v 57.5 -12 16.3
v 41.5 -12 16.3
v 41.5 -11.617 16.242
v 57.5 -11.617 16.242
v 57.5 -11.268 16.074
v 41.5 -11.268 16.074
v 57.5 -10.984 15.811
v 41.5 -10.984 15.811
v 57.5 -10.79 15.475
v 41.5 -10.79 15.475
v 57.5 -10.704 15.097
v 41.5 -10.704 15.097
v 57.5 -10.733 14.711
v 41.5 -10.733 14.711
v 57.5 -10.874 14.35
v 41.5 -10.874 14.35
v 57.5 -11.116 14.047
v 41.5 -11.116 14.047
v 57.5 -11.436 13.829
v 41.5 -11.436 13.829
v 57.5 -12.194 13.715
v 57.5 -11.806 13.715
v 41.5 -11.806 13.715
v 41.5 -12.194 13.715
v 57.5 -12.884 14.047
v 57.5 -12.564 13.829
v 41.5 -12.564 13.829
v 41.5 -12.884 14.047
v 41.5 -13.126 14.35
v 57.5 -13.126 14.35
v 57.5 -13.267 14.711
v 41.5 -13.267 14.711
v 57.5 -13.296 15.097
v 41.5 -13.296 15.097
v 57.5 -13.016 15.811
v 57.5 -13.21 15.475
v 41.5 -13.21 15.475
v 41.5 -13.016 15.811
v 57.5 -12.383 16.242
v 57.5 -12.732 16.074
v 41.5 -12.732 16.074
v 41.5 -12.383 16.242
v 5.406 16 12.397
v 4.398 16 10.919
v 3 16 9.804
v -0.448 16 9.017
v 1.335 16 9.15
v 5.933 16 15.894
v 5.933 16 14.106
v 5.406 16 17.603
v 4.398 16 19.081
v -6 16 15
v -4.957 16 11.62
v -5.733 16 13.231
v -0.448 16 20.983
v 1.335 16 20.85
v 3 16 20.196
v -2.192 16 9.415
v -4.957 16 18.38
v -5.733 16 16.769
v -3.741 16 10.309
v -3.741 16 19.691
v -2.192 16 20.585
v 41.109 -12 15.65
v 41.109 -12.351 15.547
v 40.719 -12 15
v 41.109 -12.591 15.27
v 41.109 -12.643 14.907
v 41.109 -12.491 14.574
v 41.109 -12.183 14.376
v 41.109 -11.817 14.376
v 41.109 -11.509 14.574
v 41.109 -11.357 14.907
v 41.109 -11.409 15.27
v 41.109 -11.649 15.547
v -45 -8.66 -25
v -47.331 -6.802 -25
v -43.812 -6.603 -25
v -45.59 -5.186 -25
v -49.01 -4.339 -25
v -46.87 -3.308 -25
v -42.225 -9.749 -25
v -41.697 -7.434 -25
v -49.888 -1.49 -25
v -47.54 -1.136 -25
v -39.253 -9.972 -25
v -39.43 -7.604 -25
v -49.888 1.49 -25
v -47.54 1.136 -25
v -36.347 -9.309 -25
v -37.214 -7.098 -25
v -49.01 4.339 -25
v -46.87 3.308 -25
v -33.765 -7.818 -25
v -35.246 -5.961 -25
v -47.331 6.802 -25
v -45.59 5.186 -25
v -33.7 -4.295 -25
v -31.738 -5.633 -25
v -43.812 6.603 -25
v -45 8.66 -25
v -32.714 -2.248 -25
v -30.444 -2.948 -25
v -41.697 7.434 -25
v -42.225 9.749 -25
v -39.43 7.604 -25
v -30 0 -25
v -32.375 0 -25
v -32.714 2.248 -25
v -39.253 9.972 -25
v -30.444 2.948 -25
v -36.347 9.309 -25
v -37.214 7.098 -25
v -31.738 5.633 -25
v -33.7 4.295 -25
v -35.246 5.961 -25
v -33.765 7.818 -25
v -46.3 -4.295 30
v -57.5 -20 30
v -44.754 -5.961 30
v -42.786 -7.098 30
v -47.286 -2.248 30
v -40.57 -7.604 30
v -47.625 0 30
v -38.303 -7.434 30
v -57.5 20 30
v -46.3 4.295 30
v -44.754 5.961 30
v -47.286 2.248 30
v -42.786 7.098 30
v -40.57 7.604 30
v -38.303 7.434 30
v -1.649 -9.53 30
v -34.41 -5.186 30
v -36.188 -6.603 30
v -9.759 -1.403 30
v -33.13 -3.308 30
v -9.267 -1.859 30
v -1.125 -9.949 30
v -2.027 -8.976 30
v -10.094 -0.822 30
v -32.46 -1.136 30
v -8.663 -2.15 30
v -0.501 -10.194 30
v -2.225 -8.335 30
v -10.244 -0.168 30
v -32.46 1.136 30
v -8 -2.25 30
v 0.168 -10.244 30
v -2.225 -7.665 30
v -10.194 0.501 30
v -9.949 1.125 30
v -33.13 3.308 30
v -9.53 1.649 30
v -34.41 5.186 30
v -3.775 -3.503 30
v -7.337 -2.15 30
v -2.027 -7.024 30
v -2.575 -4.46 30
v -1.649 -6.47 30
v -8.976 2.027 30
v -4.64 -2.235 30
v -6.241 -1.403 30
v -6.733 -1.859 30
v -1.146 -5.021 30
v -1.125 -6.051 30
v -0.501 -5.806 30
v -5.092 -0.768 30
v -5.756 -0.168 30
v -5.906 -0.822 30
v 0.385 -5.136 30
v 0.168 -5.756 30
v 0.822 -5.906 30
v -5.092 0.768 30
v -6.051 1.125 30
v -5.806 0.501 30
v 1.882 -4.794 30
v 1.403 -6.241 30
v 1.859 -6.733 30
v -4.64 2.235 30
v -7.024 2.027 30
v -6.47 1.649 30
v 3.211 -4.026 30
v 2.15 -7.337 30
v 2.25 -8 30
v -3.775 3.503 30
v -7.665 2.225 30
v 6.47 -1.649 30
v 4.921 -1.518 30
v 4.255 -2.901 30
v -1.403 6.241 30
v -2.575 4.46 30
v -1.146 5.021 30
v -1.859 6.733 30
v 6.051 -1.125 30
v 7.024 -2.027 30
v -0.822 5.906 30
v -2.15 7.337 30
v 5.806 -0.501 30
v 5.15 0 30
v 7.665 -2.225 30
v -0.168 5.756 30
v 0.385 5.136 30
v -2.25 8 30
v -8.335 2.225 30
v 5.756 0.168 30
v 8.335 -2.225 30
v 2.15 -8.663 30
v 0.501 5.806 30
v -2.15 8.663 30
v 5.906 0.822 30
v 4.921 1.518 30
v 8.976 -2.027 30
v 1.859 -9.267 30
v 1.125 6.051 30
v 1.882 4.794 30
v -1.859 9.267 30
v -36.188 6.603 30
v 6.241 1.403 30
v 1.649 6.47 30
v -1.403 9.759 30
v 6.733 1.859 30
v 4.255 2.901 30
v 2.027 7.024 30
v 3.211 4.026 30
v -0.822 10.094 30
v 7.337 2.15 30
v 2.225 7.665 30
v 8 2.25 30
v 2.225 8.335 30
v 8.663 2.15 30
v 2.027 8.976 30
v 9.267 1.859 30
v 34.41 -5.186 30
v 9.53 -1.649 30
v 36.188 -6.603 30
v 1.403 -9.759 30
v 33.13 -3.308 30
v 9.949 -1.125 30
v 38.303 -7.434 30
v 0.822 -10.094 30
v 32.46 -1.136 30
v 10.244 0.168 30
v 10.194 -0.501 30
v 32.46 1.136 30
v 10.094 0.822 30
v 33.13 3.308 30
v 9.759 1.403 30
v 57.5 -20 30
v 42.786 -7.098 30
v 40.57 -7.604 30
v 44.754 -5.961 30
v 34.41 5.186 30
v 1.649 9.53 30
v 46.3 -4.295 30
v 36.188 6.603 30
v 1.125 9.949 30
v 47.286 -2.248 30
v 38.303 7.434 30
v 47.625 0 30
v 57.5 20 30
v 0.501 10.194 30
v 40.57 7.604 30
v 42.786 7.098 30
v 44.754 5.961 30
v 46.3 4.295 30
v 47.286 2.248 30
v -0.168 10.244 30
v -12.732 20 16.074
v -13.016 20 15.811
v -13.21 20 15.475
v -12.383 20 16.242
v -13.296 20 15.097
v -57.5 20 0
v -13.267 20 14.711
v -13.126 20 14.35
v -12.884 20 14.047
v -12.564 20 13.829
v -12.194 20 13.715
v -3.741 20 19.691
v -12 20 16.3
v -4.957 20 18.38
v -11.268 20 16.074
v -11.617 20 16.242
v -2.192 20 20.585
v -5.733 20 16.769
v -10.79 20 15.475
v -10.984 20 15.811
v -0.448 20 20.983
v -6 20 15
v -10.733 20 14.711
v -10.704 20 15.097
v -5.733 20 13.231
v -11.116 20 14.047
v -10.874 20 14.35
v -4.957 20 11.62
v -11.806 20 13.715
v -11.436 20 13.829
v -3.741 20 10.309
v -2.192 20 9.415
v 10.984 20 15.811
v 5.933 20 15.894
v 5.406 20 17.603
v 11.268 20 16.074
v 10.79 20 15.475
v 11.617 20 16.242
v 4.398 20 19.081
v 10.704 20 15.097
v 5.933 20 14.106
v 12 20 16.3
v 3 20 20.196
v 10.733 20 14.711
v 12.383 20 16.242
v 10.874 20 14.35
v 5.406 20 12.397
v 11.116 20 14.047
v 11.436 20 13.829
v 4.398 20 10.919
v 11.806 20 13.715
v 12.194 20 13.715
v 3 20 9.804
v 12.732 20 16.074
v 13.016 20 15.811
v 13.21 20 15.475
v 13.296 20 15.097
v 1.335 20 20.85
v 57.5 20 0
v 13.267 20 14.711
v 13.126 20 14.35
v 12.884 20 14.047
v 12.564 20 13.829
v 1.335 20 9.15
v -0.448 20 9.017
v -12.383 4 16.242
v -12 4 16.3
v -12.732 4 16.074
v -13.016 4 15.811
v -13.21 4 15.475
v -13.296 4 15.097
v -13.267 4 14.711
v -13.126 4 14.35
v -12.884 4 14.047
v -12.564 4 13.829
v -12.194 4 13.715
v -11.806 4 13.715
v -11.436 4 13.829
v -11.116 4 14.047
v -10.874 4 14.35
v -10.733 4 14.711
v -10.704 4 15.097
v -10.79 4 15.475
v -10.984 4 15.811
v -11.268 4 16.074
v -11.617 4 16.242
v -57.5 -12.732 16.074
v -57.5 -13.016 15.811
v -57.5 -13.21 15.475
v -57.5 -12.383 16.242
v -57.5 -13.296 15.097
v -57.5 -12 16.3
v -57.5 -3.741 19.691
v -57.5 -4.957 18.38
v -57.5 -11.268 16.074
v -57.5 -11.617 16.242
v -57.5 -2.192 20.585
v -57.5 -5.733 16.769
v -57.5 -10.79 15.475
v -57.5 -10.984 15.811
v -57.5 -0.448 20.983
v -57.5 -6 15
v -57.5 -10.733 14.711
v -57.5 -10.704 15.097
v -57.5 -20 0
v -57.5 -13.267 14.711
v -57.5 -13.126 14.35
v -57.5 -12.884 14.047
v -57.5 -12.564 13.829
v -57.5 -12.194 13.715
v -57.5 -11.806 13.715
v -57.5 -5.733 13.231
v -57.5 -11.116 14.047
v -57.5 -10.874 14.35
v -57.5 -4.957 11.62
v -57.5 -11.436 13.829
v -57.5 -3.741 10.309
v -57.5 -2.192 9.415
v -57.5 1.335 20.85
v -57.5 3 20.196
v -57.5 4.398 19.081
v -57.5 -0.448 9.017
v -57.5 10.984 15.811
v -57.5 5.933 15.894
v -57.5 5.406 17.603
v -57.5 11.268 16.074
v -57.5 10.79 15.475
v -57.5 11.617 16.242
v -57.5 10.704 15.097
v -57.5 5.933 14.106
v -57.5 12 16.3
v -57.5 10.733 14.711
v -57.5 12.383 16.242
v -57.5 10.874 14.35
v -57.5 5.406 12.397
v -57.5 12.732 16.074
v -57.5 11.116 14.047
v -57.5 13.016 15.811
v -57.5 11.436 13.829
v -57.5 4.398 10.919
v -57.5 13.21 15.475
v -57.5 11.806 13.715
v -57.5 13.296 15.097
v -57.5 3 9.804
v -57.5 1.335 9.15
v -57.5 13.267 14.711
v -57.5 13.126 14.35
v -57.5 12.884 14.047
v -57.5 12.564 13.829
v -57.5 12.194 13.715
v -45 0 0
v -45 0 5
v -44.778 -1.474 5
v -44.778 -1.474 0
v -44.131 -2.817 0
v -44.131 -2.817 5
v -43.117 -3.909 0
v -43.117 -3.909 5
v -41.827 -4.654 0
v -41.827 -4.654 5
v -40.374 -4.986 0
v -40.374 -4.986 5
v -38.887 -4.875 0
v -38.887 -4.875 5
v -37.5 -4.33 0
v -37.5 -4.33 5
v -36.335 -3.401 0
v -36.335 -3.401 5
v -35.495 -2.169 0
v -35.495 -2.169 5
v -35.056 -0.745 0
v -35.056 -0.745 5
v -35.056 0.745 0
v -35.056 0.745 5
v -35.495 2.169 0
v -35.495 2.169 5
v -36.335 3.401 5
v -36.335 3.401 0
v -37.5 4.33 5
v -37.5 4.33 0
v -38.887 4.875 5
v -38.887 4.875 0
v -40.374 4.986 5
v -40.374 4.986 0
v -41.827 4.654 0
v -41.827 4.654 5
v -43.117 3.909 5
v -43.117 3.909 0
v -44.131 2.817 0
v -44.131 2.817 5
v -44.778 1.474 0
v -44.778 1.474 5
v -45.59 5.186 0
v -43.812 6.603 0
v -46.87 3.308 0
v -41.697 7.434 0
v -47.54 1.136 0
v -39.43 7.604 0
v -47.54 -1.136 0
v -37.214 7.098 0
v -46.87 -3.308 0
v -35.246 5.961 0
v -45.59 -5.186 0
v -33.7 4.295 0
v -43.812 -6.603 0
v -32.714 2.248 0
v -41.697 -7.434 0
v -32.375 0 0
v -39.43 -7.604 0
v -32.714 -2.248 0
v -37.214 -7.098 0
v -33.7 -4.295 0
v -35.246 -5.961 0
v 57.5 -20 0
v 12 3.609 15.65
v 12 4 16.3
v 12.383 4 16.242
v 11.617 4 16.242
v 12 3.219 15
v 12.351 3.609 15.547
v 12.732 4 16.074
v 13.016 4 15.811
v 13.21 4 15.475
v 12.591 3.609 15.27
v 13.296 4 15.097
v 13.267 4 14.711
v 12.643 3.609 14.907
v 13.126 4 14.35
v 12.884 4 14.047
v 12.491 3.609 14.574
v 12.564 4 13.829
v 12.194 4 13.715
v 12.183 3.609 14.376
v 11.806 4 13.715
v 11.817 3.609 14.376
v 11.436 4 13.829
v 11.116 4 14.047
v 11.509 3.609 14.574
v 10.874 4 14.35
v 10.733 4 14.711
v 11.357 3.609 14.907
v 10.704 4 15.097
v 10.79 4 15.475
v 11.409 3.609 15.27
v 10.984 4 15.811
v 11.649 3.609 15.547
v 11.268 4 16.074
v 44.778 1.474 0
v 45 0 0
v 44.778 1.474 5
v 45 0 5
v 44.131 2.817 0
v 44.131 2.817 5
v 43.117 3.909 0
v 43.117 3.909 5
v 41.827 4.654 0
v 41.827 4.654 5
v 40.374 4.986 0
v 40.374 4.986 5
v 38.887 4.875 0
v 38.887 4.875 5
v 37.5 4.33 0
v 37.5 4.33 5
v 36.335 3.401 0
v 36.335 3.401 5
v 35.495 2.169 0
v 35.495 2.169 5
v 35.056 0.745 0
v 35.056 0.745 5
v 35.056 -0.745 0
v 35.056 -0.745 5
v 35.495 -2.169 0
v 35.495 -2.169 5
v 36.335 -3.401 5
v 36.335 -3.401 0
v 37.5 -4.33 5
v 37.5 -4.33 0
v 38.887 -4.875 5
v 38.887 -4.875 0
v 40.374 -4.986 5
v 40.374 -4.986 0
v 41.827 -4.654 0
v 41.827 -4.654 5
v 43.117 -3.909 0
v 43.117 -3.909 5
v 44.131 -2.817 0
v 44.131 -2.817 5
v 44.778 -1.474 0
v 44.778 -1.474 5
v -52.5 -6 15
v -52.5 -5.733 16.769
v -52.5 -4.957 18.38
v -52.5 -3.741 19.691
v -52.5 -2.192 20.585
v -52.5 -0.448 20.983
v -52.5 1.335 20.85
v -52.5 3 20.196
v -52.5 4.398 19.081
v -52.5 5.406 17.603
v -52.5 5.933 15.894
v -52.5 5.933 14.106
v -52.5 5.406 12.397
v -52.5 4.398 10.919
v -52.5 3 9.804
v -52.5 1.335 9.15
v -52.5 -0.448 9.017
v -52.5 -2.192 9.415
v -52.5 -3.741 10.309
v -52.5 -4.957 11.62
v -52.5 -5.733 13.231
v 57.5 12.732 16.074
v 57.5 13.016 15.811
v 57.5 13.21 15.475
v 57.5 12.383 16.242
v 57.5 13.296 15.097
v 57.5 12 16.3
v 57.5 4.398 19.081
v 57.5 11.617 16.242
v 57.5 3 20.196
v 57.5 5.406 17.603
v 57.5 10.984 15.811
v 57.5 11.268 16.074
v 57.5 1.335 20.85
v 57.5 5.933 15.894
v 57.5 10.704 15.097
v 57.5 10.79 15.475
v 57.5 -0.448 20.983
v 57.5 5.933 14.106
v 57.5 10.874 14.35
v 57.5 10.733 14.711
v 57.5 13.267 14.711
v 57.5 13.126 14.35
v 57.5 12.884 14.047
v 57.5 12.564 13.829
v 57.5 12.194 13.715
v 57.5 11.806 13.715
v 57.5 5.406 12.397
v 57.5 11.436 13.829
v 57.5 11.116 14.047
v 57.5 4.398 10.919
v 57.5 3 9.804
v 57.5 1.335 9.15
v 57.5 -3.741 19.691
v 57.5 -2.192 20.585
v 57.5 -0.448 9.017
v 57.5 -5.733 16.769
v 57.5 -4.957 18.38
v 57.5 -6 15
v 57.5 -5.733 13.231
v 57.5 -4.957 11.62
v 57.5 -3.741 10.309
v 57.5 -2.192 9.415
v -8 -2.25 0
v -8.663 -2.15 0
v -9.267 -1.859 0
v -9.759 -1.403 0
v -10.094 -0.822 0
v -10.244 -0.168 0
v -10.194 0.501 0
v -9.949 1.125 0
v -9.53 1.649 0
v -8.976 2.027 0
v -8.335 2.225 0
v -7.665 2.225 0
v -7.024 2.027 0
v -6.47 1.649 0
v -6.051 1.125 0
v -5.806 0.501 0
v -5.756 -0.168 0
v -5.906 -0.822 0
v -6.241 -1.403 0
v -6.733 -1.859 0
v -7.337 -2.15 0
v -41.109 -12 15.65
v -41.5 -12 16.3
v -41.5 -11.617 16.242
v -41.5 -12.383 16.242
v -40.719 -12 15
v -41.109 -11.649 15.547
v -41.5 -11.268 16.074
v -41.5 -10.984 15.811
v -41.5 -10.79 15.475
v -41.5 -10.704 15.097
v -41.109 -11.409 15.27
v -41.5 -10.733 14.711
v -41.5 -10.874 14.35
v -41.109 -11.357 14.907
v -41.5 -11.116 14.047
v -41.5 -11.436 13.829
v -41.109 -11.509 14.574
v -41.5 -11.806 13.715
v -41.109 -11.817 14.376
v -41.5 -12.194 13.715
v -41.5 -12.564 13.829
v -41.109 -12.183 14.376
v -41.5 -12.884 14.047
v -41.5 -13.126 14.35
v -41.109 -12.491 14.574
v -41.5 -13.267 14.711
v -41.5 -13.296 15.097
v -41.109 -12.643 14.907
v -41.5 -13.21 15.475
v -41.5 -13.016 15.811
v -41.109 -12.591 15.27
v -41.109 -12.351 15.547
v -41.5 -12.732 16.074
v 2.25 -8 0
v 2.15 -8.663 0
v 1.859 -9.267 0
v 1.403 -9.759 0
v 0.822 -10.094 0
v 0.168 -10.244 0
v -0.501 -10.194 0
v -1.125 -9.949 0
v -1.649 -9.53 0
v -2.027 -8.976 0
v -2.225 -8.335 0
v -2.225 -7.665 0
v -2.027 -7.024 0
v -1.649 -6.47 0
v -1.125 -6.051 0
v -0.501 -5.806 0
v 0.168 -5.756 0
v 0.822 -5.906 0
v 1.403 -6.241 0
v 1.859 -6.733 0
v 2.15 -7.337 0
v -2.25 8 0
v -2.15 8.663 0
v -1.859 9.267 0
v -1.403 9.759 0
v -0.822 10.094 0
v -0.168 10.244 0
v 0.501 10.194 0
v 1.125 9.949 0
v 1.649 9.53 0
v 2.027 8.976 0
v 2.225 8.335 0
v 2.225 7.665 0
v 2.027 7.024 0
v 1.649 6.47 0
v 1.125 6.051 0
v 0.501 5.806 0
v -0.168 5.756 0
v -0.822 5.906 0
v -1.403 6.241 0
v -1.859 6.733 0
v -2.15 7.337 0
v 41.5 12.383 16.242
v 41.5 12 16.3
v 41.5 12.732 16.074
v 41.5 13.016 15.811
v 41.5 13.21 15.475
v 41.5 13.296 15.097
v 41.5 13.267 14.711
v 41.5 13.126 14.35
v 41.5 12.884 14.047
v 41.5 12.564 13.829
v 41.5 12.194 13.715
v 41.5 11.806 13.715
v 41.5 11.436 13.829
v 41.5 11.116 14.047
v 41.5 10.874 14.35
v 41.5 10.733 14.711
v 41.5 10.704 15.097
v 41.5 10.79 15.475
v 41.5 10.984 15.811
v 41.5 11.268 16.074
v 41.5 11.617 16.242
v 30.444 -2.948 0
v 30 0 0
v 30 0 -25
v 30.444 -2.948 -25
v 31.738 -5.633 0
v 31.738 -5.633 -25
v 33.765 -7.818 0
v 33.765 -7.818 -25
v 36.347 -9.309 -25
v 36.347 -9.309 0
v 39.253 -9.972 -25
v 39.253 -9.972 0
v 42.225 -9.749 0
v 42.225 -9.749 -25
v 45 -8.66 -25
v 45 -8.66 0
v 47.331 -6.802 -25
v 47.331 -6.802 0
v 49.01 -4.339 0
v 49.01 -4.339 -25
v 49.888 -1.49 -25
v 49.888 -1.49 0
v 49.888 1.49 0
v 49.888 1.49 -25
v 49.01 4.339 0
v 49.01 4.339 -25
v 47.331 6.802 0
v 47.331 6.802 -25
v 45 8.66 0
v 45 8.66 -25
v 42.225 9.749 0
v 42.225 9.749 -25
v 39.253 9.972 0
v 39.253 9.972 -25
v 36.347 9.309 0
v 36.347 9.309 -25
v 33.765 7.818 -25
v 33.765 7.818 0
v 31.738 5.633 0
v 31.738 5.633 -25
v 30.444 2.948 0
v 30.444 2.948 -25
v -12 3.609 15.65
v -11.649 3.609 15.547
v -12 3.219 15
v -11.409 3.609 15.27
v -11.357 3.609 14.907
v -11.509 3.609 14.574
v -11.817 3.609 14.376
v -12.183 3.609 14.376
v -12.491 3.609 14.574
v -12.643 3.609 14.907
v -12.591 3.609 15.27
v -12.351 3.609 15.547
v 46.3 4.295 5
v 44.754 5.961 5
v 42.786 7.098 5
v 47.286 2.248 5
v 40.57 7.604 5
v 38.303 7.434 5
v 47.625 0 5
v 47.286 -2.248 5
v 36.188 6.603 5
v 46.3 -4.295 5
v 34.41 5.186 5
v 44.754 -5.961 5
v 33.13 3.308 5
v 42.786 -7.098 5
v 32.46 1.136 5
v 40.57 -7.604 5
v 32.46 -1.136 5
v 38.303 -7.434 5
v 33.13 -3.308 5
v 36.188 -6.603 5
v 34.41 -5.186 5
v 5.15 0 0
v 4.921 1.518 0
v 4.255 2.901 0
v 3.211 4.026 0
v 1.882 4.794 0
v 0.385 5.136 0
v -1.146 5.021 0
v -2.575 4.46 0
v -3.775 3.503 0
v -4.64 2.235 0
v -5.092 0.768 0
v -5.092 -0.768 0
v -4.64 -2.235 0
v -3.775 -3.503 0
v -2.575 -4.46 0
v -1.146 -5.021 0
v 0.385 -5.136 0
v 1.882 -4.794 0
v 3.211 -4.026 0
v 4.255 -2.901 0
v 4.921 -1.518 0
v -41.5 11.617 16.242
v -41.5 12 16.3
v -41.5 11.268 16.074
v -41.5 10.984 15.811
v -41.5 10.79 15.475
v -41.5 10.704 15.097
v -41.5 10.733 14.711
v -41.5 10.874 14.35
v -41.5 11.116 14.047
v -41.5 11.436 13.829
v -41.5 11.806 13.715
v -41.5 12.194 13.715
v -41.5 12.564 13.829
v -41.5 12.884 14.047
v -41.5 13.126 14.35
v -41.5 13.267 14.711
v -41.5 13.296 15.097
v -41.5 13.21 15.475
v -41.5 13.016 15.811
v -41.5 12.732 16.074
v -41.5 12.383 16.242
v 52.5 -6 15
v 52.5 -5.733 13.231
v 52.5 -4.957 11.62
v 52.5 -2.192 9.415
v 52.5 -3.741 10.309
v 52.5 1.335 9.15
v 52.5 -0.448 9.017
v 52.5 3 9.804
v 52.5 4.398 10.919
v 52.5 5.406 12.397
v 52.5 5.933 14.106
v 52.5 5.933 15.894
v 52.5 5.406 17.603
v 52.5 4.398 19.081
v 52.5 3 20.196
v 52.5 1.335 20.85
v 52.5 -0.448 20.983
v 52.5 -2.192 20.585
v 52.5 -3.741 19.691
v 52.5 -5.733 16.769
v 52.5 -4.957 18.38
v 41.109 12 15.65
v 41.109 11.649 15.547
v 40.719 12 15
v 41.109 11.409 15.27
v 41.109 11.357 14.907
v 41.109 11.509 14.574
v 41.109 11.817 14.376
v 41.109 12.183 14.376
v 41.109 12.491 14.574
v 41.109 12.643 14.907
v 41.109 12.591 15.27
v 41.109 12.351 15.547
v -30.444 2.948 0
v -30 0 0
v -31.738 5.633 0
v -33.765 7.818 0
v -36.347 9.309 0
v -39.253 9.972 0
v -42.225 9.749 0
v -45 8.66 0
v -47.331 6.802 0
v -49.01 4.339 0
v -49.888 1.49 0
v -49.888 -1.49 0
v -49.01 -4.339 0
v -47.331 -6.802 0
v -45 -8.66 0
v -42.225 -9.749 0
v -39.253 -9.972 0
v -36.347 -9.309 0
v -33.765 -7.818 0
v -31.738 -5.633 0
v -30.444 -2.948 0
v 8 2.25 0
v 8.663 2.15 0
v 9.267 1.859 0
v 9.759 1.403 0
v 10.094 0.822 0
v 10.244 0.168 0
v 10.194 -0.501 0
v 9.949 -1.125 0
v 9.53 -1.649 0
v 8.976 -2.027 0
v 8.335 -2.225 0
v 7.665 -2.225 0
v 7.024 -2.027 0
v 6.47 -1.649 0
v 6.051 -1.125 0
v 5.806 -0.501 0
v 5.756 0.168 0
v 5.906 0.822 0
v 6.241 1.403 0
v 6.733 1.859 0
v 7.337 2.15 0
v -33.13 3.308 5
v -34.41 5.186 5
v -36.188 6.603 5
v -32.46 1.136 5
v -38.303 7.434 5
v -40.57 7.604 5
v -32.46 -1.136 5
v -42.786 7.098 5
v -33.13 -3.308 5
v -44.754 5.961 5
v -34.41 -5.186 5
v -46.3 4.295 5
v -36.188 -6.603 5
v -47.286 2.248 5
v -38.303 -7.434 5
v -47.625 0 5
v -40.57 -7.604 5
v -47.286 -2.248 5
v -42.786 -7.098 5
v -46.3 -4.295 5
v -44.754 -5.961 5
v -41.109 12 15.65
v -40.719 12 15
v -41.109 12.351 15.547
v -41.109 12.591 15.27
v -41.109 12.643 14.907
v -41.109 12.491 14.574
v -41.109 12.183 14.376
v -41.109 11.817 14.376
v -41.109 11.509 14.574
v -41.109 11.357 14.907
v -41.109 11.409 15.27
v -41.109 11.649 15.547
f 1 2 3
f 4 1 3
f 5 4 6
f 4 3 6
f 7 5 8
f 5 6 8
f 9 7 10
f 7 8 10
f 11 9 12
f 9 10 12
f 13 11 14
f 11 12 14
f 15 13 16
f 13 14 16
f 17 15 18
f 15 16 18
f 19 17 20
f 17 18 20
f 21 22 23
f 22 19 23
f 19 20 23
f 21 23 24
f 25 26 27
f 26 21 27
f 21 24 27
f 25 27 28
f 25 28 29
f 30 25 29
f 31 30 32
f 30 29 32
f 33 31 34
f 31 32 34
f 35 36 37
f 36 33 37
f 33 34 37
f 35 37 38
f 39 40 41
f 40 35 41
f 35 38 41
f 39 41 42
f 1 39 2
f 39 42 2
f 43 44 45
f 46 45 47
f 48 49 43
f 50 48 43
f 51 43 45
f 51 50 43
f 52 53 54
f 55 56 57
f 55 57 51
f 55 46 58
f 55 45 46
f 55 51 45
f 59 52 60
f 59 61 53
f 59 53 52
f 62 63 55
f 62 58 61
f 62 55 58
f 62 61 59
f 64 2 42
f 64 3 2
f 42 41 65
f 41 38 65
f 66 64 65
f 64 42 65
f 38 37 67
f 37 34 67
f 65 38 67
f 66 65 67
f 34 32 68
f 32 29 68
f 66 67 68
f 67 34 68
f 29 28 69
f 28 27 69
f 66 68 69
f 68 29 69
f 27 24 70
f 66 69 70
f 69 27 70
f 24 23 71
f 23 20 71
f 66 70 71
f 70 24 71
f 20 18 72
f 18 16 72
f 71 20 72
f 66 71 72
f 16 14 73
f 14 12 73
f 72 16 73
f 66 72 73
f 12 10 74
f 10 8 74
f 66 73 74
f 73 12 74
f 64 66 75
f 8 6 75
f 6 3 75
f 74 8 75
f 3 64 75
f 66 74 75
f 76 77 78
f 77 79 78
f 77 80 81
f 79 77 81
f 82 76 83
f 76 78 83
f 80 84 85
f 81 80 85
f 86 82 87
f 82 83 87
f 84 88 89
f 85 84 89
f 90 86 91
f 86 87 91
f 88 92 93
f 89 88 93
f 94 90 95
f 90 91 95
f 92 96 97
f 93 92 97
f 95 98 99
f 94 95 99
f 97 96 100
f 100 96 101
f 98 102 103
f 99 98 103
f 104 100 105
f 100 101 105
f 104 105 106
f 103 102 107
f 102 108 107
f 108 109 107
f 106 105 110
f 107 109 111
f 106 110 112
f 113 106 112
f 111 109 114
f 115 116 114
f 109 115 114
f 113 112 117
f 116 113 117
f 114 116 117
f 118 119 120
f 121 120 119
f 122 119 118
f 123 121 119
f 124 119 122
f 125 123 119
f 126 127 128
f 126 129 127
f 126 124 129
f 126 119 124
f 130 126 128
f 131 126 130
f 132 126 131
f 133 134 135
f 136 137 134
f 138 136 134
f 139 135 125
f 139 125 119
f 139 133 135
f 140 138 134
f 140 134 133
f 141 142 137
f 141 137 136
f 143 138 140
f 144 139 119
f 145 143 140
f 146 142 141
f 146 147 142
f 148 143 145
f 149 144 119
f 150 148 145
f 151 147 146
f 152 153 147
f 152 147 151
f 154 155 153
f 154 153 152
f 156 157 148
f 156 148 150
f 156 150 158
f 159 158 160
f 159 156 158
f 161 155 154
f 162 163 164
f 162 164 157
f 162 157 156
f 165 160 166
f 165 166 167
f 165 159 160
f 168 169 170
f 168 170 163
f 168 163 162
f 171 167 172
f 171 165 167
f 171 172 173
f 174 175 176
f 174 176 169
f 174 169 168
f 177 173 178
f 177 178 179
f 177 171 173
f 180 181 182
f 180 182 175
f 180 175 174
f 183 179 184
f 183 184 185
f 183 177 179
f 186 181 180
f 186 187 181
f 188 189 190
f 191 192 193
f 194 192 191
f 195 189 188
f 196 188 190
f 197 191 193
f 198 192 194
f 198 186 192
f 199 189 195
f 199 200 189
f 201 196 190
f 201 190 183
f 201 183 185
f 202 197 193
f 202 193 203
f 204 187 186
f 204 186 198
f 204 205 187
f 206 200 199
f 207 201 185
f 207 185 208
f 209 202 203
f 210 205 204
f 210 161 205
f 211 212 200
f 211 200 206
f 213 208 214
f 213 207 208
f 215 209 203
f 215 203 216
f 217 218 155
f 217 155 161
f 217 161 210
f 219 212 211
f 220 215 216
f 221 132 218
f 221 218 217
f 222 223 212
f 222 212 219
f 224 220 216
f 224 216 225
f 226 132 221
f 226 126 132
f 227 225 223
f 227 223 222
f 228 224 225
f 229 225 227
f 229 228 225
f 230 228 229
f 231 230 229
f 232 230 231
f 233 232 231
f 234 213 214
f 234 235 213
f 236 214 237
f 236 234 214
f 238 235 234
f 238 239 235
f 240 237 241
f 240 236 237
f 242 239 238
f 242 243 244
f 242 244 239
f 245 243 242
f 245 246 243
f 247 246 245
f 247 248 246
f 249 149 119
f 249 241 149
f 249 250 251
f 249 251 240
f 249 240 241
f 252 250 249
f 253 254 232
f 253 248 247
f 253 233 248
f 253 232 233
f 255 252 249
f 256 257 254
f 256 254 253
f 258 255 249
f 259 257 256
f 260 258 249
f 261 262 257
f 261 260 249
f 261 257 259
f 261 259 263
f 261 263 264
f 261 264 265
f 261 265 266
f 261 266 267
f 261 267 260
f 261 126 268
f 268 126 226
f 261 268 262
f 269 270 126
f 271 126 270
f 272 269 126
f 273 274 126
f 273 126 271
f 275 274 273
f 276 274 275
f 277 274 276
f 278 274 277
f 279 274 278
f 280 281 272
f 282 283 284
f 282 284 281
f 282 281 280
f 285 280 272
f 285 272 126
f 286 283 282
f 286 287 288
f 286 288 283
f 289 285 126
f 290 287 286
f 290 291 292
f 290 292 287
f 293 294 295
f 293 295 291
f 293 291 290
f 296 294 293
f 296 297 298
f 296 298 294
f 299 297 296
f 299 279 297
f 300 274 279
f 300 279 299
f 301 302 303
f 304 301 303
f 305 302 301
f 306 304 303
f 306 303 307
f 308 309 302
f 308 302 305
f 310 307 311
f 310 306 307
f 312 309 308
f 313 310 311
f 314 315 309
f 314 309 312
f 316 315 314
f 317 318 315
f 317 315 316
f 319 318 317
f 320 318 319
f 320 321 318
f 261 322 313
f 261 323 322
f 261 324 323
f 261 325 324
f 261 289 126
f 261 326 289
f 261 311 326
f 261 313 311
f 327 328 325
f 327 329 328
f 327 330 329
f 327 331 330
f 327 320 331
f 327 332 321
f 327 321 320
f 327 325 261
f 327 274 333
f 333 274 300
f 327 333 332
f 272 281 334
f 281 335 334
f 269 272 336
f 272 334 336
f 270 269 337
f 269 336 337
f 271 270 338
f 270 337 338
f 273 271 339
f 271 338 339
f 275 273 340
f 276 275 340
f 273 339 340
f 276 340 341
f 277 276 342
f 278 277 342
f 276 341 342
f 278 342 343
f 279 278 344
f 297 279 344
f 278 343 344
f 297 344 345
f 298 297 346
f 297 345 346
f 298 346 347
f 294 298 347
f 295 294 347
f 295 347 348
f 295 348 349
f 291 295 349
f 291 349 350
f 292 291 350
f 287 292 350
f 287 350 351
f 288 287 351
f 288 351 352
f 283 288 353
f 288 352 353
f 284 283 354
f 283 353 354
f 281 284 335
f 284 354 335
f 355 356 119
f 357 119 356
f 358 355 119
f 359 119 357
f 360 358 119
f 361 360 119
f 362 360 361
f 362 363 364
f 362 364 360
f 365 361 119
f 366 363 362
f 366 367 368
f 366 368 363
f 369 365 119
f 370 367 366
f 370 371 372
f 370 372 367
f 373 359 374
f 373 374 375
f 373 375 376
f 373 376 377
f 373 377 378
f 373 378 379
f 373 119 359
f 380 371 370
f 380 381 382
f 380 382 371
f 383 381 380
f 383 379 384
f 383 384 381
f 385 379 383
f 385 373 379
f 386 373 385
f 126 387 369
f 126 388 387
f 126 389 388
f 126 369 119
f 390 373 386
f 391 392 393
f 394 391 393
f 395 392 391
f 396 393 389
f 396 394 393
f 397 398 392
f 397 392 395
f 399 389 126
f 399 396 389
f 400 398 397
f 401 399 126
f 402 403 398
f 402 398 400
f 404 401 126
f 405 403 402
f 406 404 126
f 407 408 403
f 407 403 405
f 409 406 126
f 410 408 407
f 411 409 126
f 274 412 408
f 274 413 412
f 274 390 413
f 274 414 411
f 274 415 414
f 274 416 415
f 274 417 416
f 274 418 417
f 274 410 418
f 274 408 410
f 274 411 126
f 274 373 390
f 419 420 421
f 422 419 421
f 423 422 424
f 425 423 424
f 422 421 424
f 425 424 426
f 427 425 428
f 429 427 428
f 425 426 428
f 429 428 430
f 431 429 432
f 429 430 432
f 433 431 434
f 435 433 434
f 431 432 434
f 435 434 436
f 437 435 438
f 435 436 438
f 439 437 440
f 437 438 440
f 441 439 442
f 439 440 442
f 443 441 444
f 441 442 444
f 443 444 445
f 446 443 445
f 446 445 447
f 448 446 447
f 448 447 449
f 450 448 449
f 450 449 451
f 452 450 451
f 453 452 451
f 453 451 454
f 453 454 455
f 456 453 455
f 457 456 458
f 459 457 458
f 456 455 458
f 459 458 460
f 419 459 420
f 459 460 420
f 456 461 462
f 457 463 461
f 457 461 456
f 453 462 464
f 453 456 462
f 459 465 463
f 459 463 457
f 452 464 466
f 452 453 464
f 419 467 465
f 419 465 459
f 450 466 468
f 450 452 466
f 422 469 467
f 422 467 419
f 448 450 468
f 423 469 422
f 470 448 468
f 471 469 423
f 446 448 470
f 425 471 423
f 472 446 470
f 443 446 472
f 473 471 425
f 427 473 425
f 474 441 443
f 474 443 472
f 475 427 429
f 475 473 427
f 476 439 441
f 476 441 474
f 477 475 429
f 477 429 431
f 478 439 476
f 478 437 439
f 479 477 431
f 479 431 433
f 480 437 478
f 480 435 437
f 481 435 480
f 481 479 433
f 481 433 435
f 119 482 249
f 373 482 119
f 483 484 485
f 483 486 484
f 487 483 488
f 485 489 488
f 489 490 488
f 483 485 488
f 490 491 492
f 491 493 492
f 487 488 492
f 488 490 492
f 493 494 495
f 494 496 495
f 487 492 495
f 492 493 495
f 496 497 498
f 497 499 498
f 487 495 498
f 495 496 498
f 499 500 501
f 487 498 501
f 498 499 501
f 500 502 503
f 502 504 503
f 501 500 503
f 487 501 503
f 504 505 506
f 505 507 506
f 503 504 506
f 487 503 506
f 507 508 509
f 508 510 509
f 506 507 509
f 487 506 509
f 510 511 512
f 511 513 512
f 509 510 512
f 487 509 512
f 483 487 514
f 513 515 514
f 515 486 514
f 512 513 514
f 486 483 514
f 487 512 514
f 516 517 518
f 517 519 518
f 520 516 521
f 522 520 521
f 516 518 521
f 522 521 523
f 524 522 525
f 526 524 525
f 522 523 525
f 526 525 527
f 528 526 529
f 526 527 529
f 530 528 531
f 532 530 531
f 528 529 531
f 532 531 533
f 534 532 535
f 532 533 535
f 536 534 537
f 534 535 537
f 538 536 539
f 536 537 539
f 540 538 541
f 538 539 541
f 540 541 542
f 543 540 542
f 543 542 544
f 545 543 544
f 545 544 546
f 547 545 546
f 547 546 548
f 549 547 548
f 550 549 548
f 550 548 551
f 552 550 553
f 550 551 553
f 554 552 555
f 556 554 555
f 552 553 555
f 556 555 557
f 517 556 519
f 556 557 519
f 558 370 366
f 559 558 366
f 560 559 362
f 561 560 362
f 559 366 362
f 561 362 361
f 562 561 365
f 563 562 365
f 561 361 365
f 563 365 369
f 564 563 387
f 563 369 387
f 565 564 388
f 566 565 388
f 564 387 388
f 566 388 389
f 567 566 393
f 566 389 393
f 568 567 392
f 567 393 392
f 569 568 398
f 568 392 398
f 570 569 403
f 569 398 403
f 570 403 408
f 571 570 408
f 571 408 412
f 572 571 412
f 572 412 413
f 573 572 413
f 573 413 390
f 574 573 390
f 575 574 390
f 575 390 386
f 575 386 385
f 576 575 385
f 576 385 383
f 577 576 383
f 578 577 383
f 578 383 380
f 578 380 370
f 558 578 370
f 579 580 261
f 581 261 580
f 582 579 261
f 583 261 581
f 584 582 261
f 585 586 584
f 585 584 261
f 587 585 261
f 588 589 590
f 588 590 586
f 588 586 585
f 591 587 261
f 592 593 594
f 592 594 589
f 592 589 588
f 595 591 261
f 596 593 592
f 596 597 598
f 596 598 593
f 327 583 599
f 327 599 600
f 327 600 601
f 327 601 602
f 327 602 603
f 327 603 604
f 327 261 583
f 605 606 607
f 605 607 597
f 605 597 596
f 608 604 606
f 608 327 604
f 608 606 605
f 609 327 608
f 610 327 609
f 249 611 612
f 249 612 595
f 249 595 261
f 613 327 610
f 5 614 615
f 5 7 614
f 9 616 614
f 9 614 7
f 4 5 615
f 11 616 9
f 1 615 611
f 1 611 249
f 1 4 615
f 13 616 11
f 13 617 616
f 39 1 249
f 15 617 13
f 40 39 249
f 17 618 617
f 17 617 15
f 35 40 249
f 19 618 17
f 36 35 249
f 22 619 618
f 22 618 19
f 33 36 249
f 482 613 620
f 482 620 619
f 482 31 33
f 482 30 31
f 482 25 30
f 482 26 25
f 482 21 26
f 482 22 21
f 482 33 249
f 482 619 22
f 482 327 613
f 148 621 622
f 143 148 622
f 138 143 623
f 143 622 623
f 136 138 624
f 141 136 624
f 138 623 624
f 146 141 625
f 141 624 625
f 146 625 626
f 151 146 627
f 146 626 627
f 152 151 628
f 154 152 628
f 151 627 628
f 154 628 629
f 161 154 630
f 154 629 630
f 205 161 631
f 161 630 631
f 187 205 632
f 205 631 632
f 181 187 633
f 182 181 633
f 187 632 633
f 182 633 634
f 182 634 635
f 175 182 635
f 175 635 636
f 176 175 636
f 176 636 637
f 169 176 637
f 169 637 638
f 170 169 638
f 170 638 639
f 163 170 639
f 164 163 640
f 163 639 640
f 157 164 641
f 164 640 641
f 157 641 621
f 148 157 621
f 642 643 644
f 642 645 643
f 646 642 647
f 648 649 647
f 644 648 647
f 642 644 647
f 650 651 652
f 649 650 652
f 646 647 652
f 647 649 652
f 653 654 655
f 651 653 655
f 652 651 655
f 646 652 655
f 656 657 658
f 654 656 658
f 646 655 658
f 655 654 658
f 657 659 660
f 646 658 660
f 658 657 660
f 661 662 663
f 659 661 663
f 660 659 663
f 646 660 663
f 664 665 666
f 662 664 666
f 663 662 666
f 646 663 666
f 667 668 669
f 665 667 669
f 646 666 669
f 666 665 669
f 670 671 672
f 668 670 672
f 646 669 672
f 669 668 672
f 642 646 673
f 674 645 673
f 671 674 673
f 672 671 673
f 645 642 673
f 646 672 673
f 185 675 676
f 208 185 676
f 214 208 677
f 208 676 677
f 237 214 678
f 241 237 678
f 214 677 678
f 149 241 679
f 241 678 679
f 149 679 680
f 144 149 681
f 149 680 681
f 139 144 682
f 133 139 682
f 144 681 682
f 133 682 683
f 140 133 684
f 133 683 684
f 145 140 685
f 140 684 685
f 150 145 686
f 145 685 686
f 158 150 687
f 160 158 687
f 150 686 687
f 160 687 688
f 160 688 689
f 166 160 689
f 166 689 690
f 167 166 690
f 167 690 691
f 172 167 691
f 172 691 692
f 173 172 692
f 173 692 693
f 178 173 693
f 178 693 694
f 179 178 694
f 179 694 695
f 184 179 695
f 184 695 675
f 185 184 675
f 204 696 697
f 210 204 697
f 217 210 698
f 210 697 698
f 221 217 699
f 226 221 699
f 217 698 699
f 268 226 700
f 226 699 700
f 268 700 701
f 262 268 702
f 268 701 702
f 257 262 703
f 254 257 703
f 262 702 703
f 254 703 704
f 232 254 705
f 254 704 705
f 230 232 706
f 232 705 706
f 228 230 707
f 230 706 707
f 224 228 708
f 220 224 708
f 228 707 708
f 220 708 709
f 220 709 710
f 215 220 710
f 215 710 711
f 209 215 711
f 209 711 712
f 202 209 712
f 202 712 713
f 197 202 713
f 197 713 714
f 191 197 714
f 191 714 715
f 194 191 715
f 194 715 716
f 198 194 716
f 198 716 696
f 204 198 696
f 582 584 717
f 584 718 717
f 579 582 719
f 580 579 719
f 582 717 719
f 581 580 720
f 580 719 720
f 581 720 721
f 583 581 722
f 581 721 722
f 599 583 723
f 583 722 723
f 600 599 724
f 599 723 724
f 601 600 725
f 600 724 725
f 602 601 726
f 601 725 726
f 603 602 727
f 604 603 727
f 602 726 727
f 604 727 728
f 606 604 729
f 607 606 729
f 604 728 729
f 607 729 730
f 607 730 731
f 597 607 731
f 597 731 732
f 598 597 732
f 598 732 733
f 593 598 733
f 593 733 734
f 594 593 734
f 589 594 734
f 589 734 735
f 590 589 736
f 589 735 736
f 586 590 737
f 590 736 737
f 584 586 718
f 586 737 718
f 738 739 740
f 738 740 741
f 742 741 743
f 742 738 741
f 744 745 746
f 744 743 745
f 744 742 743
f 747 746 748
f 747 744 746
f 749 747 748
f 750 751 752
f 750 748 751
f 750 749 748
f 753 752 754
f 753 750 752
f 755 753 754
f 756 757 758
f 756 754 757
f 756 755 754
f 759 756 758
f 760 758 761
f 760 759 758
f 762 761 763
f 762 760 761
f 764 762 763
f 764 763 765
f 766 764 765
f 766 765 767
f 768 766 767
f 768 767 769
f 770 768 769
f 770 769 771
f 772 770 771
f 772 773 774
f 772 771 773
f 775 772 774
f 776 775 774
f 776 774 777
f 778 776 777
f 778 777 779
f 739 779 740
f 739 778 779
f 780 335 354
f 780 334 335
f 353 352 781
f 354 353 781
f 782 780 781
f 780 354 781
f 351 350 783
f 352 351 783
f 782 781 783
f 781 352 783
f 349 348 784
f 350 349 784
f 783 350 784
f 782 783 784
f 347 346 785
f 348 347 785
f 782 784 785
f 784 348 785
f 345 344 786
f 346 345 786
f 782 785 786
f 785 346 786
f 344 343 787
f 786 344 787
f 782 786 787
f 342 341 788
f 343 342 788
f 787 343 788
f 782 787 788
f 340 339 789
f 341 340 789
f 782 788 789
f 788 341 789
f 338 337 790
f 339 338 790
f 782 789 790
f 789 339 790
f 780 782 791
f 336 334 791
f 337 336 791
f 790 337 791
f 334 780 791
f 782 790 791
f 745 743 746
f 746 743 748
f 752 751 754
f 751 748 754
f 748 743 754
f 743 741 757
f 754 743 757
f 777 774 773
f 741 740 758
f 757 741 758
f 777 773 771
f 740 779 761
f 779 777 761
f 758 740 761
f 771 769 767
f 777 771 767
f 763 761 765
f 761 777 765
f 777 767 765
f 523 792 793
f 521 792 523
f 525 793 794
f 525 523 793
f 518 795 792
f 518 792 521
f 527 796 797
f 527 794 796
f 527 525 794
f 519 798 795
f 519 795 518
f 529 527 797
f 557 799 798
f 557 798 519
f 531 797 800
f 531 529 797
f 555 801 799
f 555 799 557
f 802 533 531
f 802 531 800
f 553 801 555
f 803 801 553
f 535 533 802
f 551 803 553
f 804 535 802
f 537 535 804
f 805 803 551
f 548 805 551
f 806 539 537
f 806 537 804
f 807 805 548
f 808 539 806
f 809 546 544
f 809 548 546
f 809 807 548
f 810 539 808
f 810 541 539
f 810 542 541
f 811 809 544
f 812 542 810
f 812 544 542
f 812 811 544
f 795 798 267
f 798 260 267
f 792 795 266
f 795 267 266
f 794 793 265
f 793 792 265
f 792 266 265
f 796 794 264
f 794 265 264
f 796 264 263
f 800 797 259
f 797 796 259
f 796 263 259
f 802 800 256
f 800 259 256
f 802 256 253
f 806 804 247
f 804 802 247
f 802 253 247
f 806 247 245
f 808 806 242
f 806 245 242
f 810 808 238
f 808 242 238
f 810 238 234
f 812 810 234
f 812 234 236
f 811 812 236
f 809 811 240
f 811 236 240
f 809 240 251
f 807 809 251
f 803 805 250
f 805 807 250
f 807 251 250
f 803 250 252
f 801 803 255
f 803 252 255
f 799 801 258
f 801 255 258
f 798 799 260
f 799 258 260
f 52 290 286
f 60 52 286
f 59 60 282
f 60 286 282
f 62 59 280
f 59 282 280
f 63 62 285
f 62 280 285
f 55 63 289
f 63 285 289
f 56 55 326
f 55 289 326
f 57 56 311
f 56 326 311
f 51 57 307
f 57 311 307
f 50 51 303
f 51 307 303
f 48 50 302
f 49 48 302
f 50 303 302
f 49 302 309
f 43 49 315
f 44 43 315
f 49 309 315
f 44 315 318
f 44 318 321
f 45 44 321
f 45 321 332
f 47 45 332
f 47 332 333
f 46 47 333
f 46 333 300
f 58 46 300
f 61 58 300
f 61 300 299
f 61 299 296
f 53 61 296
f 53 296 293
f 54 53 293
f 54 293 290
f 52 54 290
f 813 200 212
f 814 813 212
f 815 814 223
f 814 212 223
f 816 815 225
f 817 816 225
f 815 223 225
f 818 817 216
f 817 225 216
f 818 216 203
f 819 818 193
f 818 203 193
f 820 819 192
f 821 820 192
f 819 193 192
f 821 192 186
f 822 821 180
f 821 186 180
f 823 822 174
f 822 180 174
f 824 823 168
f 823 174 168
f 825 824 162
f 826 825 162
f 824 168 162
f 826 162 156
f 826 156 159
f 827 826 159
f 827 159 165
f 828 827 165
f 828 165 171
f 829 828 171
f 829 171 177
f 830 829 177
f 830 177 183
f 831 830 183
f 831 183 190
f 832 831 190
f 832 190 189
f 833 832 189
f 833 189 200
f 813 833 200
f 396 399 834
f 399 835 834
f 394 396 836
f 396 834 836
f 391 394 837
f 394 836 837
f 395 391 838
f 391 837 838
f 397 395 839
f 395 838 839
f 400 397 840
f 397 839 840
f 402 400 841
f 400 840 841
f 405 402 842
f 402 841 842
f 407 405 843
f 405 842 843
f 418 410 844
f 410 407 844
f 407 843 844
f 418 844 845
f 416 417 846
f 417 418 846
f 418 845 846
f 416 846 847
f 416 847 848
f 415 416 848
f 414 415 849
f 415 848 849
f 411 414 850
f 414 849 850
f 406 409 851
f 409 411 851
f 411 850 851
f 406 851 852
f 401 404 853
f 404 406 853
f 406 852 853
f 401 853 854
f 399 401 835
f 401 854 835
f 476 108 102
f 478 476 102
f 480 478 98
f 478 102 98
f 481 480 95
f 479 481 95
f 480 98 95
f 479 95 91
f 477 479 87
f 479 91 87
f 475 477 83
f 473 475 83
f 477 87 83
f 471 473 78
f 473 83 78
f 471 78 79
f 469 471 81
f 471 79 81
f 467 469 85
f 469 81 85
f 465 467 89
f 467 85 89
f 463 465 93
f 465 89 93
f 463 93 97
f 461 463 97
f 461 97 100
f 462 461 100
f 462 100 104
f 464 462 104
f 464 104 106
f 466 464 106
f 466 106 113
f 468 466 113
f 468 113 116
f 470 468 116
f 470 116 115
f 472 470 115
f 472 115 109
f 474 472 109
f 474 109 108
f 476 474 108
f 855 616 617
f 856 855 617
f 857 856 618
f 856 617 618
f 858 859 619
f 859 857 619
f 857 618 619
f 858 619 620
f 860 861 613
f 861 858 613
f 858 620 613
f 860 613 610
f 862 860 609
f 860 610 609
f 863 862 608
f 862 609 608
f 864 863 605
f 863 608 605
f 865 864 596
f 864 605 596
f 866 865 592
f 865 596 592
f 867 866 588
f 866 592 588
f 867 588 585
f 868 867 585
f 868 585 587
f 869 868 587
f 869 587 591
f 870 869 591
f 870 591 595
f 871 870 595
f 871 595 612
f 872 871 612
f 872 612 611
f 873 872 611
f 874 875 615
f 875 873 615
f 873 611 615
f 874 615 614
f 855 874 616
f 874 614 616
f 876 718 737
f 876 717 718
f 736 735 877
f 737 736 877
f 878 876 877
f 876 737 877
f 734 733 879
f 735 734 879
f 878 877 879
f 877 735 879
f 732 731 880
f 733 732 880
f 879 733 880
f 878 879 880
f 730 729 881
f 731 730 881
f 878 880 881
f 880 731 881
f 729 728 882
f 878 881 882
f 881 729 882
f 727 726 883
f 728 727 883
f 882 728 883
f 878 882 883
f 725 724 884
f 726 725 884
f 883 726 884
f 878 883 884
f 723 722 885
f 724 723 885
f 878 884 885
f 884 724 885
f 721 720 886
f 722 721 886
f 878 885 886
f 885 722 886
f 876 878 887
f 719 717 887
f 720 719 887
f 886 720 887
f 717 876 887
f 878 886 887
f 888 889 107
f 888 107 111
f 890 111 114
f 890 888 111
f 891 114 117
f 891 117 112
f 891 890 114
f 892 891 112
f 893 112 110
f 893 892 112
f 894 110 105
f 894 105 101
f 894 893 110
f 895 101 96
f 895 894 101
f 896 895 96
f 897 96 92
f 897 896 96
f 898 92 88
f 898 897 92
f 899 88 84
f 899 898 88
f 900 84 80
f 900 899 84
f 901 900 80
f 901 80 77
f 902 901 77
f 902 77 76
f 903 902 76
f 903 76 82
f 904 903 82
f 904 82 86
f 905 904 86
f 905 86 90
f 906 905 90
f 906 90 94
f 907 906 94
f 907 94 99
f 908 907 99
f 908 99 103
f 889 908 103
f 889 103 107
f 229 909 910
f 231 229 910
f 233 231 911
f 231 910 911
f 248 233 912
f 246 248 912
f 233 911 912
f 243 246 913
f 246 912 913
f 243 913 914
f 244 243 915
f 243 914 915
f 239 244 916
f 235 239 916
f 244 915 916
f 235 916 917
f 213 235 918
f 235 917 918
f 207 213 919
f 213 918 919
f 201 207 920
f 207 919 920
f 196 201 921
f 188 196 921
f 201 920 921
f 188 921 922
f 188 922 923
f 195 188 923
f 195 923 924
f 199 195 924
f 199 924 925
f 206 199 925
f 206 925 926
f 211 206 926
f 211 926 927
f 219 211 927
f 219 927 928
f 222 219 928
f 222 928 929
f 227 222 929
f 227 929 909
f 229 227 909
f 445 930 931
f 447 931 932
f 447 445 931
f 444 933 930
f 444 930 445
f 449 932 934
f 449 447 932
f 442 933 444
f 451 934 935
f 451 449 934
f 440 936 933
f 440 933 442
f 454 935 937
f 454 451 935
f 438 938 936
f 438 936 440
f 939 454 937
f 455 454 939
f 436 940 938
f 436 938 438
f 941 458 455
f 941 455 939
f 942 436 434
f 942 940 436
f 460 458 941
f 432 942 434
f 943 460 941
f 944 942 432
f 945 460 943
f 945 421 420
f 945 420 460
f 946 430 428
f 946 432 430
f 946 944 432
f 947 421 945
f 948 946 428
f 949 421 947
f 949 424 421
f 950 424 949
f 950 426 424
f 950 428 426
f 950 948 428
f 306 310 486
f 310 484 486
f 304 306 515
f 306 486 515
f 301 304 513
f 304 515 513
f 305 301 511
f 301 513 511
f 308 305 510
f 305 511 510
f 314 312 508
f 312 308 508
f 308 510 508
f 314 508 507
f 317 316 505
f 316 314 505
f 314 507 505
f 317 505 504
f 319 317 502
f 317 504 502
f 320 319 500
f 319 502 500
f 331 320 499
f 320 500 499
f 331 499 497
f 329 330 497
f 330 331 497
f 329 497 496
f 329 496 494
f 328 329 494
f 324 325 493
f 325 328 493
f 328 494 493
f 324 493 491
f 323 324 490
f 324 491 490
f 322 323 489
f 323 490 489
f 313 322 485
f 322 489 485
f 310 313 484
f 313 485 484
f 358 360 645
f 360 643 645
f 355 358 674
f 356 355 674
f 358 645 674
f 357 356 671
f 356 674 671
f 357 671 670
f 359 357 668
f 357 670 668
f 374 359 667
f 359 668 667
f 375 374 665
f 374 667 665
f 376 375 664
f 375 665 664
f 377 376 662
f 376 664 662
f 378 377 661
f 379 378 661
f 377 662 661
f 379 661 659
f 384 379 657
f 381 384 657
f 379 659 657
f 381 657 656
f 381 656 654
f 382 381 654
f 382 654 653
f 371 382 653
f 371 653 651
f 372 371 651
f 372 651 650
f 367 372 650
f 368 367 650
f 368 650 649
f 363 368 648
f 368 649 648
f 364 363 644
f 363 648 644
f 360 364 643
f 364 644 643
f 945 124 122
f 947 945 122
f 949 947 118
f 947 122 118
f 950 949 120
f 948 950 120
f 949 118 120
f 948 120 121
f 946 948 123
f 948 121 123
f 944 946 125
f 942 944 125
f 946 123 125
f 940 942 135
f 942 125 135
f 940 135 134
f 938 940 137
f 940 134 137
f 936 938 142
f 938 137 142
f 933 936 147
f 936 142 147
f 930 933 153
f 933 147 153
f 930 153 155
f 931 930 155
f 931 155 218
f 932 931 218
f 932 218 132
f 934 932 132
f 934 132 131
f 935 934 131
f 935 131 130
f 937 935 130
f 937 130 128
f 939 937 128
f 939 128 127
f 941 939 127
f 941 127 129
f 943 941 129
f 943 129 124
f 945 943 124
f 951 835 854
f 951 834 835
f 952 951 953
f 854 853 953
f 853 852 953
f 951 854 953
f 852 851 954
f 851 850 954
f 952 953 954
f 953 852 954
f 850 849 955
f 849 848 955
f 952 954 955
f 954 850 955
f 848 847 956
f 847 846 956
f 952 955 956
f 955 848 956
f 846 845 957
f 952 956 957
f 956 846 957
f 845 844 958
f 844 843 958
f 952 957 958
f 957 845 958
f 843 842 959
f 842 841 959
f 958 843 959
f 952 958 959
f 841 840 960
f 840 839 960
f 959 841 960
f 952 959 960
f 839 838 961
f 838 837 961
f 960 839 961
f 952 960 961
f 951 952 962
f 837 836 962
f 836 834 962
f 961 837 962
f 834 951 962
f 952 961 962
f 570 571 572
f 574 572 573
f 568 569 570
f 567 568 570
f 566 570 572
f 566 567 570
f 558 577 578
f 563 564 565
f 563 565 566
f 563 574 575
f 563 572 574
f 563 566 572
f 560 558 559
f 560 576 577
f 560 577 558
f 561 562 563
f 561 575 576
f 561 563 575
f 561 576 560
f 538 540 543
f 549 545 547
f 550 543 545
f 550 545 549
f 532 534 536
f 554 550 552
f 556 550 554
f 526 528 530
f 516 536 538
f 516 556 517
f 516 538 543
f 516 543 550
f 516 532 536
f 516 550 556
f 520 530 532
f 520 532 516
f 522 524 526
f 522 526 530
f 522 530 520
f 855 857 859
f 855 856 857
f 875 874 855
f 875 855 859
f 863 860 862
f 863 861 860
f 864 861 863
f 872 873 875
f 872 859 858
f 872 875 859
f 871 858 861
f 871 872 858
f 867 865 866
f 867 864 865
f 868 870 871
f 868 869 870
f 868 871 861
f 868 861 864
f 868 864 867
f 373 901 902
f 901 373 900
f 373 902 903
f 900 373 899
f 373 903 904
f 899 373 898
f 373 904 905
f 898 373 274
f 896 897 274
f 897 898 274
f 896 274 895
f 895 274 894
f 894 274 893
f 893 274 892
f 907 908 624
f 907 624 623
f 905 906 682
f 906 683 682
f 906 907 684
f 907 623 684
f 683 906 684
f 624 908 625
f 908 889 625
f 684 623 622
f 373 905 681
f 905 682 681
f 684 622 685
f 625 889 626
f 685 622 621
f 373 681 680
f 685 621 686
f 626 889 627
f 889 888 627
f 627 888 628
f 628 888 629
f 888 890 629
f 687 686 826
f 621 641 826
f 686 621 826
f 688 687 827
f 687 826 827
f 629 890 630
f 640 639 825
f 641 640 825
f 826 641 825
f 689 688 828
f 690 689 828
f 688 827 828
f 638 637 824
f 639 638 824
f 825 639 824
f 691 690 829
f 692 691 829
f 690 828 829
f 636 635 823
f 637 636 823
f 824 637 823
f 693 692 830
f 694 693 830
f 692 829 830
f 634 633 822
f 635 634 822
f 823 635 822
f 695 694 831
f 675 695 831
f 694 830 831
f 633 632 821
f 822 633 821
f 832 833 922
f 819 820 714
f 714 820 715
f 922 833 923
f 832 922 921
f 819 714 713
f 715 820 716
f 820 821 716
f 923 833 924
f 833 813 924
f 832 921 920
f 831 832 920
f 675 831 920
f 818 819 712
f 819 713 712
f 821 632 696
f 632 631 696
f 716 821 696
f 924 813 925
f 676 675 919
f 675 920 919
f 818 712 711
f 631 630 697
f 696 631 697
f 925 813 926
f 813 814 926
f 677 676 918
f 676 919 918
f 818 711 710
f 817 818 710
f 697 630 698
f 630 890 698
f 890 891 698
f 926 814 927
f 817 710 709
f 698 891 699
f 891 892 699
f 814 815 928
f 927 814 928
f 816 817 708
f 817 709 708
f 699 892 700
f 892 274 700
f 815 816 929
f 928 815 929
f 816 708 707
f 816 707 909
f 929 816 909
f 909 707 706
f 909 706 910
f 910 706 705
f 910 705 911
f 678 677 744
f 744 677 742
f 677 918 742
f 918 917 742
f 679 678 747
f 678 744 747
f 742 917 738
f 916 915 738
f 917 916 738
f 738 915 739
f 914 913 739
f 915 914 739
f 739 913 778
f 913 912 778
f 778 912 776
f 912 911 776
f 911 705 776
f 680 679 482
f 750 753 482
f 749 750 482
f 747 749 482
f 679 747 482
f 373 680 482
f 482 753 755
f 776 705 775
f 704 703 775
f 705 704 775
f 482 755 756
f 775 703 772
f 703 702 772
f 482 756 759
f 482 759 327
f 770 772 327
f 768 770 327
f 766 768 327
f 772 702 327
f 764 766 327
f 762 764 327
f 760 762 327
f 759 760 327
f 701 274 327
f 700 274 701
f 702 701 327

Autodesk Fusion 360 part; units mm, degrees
sketch "Esquisse1" plane through (0, 0, 0) normal (0, 0, 1) x (1, 0, 0)
  line L0 (-57.5, 20) -> (57.5, 20)
  line L1 (57.5, 20) -> (57.5, -20)
  line L2 (57.5, -20) -> (-57.5, -20)
  line L3 (-57.5, -20) -> (-57.5, 20)
  line L4 (0, 1.75) -> (0, 22.5)
  line L5 (1.75, 0) -> (22.5, 0)
  dimension "d1" = 115
  dimension "d2" = 40
extrude "Extrusion1" add sketch "Esquisse1" along normal blind 30
sketch "Esquisse2" plane through (0, 0, 30) normal (0, 0, 1) x (-1, 0, 0)
  line L0 (57.5, 20) -> (-57.5, 20)
  line L1 (-57.5, 20) -> (-57.5, -20)
  line L2 (-57.5, -20) -> (57.5, -20)
  line L3 (57.5, -20) -> (57.5, 20)
  circle A0 centre (40, 0) radius 7.625
  line L4 (0, -1.75) -> (0, -22.5)
  line L5 (-1.75, 0) -> (-22.5, 0)
  dimension "d5" = 15.25
  dimension "d6" = 40
extrude "Extrusion2" cut sketch "Esquisse2" against normal blind 25 contours A0
mirror "Symétrie miroir1" about plane through (0, 0, 0) normal (1, 0, 0) of "Extrusion2"
sketch "Esquisse3" plane through (0, 0, 30) normal (0, 0, 1) x (-1, 0, 0)
  circle A0 centre (-40, 0) radius 7.625
  circle A1 centre (40, 0) radius 7.625
  line L0 (57.5, 20) -> (-57.5, 20)
  line L1 (-57.5, 20) -> (-57.5, -20)
  line L2 (-57.5, -20) -> (57.5, -20)
  line L3 (57.5, -20) -> (57.5, 20)
sketch "Esquisse4" plane through (0, 0, 30) normal (0, 0, 1) x (1, 0, 0)
  circle A0 centre (-40, 0) radius 12 construction
  line L0 (1.75, 0) -> (22.5, 0)
  point P0 (-52, 0)
  dimension "d11" = 24
  dimension "d12" = 40
sketch "Esquisse5" plane through (0, 0, 30) normal (0, 0, 1) x (1, 0, 0)
  circle A0 centre (0, 0) radius 5.15
  dimension "d20" = 10.3
extrude "Extrusion3" cut sketch "Esquisse5" against normal blind 75
sketch "Esquisse6" plane through (0, 0, 30) normal (0, 0, 1) x (1, 0, 0)
  point P0 (-8, 0)
  dimension "d23" = 8
hole "Perçage2" at (-8, 0, 30) direction (0, 0, -1) diameter 4.5 depth 50 tip angle 118
pattern_circular "Réseau C2" count 4 over 360 about axis through (0, 0, 30) along (0, 0, -1) of "Perçage2"
sketch "Esquisse7" plane through (0, 0, 30) normal (0, 0, 1) x (1, 0, 0)
sketch "Esquisse8" plane through (0, 0, 30) normal (0, 0, 1) x (-1, 0, 0)
  circle A0 centre (40, 0) radius 5
  dimension "d31" = 10
extrude "Extrusion4" cut sketch "Esquisse8" against normal blind 51
mirror "Symétrie miroir4" about plane through (0, 0, 0) normal (1, 0, 0) of "Extrusion4"
sketch "Esquisse9" plane through (0, 0, 0) normal (0, 0, 1) x (1, 0, 0)
  circle A0 centre (-40, 0) radius 10
  dimension "d36" = 20
extrude "Extrusion5" add sketch "Esquisse9" against normal blind 25
sketch "Esquisse10" plane through (0, 0, -25) normal (0, 0, -1) x (1, 0, 0)
  circle A0 centre (-40, 0) radius 10
sketch "Esquisse11" plane through (0, 0, -25) normal (0, 0, -1) x (1, 0, 0)
  circle A0 centre (-40, 0) radius 7.625
  dimension "d39" = 15.25
extrude "Extrusion6" cut sketch "Esquisse11" against normal blind 25
mirror "Symétrie miroir5" about plane through (0, 0, 0) normal (1, 0, 0) of "Extrusion6", "Extrusion5"
sketch "Esquisse12" plane through (0, 20, 0) normal (0, 1, 0) x (-1, 0, 0)
  line L0 (-57.5, 0) -> (57.5, 0)
  line L1 (57.5, 0) -> (57.5, 30)
  line L2 (57.5, 30) -> (-57.5, 30)
  line L3 (-57.5, 30) -> (-57.5, 0)
  circle A0 centre (0, 15) radius 6
  dimension "d44" = 12
extrude "Extrusion7" cut sketch "Esquisse12" against normal blind 4 contours A0
sketch "Esquisse13" plane through (0, 20, 0) normal (0, 1, 0) x (-1, 0, 0)
  circle A0 centre (0, 15) radius 6
  line L0 (-57.5, 0) -> (57.5, 0)
  line L1 (57.5, 0) -> (57.5, 30)
  line L2 (57.5, 30) -> (-57.5, 30)
  line L3 (-57.5, 30) -> (-57.5, 0)
sketch "Esquisse14" plane through (0, 20, 0) normal (0, 1, 0) x (-1, 0, 0)
  line L0 (57.5, 0) -> (-57.5, 0)
  point P0 (12, 15)
  point P1 (0, 15)
  dimension "d47" = 12
  dimension "d48" = 15
hole "Perçage3" at (-12, 20, 15) direction (0, -1, 0) diameter 2.6 depth 16 tip angle 118
mirror "Symétrie miroir6" about plane through (0, 0, 0) normal (1, 0, 0) of "Perçage3"
sketch "Esquisse15" plane through (-57.5, 0, 0) normal (-1, 0, 0) x (0, -1, 0)
  line L0 (-20, 0) -> (20, 0)
  line L1 (20, 0) -> (20, 30)
  line L2 (20, 30) -> (-20, 30)
  line L3 (-20, 30) -> (-20, 0)
  circle A0 centre (0, 15) radius 6
  line L4 (20, 0) -> (-20, 0)
  dimension "d54" = 12
  dimension "d55" = 15
  dimension "d56" = 20
extrude "Extrusion8" cut sketch "Esquisse15" against normal blind 5 contours A0
sketch "Esquisse16" plane through (-57.5, 0, 0) normal (-1, 0, 0) x (0, -1, 0)
  circle A0 centre (0, 15) radius 6
  line L0 (-20, 0) -> (20, 0)
  line L1 (20, 0) -> (20, 30)
  line L2 (20, 30) -> (-20, 30)
  line L3 (-20, 30) -> (-20, 0)
  line L4 (20, 0) -> (-20, 0)
  point P0 (12, 15)
  dimension "d59" = 12
  dimension "d60" = 15
hole "Perçage4" at (-57.5, -12, 15) direction (1, 0, 0) diameter 2.6 depth 16 tip angle 118
mirror "Symétrie miroir7" about plane through (0, 0, 0) normal (0, 1, 0) of "Perçage4"
mirror "Symétrie miroir8" about plane through (0, 0, 0) normal (1, 0, 0) of "Symétrie miroir7", "Perçage4", "Extrusion8"
equation "d23 = ( 19.5 / 2 ) * 1 mm - ( 3.5 / 2 ) * 1 mm"
